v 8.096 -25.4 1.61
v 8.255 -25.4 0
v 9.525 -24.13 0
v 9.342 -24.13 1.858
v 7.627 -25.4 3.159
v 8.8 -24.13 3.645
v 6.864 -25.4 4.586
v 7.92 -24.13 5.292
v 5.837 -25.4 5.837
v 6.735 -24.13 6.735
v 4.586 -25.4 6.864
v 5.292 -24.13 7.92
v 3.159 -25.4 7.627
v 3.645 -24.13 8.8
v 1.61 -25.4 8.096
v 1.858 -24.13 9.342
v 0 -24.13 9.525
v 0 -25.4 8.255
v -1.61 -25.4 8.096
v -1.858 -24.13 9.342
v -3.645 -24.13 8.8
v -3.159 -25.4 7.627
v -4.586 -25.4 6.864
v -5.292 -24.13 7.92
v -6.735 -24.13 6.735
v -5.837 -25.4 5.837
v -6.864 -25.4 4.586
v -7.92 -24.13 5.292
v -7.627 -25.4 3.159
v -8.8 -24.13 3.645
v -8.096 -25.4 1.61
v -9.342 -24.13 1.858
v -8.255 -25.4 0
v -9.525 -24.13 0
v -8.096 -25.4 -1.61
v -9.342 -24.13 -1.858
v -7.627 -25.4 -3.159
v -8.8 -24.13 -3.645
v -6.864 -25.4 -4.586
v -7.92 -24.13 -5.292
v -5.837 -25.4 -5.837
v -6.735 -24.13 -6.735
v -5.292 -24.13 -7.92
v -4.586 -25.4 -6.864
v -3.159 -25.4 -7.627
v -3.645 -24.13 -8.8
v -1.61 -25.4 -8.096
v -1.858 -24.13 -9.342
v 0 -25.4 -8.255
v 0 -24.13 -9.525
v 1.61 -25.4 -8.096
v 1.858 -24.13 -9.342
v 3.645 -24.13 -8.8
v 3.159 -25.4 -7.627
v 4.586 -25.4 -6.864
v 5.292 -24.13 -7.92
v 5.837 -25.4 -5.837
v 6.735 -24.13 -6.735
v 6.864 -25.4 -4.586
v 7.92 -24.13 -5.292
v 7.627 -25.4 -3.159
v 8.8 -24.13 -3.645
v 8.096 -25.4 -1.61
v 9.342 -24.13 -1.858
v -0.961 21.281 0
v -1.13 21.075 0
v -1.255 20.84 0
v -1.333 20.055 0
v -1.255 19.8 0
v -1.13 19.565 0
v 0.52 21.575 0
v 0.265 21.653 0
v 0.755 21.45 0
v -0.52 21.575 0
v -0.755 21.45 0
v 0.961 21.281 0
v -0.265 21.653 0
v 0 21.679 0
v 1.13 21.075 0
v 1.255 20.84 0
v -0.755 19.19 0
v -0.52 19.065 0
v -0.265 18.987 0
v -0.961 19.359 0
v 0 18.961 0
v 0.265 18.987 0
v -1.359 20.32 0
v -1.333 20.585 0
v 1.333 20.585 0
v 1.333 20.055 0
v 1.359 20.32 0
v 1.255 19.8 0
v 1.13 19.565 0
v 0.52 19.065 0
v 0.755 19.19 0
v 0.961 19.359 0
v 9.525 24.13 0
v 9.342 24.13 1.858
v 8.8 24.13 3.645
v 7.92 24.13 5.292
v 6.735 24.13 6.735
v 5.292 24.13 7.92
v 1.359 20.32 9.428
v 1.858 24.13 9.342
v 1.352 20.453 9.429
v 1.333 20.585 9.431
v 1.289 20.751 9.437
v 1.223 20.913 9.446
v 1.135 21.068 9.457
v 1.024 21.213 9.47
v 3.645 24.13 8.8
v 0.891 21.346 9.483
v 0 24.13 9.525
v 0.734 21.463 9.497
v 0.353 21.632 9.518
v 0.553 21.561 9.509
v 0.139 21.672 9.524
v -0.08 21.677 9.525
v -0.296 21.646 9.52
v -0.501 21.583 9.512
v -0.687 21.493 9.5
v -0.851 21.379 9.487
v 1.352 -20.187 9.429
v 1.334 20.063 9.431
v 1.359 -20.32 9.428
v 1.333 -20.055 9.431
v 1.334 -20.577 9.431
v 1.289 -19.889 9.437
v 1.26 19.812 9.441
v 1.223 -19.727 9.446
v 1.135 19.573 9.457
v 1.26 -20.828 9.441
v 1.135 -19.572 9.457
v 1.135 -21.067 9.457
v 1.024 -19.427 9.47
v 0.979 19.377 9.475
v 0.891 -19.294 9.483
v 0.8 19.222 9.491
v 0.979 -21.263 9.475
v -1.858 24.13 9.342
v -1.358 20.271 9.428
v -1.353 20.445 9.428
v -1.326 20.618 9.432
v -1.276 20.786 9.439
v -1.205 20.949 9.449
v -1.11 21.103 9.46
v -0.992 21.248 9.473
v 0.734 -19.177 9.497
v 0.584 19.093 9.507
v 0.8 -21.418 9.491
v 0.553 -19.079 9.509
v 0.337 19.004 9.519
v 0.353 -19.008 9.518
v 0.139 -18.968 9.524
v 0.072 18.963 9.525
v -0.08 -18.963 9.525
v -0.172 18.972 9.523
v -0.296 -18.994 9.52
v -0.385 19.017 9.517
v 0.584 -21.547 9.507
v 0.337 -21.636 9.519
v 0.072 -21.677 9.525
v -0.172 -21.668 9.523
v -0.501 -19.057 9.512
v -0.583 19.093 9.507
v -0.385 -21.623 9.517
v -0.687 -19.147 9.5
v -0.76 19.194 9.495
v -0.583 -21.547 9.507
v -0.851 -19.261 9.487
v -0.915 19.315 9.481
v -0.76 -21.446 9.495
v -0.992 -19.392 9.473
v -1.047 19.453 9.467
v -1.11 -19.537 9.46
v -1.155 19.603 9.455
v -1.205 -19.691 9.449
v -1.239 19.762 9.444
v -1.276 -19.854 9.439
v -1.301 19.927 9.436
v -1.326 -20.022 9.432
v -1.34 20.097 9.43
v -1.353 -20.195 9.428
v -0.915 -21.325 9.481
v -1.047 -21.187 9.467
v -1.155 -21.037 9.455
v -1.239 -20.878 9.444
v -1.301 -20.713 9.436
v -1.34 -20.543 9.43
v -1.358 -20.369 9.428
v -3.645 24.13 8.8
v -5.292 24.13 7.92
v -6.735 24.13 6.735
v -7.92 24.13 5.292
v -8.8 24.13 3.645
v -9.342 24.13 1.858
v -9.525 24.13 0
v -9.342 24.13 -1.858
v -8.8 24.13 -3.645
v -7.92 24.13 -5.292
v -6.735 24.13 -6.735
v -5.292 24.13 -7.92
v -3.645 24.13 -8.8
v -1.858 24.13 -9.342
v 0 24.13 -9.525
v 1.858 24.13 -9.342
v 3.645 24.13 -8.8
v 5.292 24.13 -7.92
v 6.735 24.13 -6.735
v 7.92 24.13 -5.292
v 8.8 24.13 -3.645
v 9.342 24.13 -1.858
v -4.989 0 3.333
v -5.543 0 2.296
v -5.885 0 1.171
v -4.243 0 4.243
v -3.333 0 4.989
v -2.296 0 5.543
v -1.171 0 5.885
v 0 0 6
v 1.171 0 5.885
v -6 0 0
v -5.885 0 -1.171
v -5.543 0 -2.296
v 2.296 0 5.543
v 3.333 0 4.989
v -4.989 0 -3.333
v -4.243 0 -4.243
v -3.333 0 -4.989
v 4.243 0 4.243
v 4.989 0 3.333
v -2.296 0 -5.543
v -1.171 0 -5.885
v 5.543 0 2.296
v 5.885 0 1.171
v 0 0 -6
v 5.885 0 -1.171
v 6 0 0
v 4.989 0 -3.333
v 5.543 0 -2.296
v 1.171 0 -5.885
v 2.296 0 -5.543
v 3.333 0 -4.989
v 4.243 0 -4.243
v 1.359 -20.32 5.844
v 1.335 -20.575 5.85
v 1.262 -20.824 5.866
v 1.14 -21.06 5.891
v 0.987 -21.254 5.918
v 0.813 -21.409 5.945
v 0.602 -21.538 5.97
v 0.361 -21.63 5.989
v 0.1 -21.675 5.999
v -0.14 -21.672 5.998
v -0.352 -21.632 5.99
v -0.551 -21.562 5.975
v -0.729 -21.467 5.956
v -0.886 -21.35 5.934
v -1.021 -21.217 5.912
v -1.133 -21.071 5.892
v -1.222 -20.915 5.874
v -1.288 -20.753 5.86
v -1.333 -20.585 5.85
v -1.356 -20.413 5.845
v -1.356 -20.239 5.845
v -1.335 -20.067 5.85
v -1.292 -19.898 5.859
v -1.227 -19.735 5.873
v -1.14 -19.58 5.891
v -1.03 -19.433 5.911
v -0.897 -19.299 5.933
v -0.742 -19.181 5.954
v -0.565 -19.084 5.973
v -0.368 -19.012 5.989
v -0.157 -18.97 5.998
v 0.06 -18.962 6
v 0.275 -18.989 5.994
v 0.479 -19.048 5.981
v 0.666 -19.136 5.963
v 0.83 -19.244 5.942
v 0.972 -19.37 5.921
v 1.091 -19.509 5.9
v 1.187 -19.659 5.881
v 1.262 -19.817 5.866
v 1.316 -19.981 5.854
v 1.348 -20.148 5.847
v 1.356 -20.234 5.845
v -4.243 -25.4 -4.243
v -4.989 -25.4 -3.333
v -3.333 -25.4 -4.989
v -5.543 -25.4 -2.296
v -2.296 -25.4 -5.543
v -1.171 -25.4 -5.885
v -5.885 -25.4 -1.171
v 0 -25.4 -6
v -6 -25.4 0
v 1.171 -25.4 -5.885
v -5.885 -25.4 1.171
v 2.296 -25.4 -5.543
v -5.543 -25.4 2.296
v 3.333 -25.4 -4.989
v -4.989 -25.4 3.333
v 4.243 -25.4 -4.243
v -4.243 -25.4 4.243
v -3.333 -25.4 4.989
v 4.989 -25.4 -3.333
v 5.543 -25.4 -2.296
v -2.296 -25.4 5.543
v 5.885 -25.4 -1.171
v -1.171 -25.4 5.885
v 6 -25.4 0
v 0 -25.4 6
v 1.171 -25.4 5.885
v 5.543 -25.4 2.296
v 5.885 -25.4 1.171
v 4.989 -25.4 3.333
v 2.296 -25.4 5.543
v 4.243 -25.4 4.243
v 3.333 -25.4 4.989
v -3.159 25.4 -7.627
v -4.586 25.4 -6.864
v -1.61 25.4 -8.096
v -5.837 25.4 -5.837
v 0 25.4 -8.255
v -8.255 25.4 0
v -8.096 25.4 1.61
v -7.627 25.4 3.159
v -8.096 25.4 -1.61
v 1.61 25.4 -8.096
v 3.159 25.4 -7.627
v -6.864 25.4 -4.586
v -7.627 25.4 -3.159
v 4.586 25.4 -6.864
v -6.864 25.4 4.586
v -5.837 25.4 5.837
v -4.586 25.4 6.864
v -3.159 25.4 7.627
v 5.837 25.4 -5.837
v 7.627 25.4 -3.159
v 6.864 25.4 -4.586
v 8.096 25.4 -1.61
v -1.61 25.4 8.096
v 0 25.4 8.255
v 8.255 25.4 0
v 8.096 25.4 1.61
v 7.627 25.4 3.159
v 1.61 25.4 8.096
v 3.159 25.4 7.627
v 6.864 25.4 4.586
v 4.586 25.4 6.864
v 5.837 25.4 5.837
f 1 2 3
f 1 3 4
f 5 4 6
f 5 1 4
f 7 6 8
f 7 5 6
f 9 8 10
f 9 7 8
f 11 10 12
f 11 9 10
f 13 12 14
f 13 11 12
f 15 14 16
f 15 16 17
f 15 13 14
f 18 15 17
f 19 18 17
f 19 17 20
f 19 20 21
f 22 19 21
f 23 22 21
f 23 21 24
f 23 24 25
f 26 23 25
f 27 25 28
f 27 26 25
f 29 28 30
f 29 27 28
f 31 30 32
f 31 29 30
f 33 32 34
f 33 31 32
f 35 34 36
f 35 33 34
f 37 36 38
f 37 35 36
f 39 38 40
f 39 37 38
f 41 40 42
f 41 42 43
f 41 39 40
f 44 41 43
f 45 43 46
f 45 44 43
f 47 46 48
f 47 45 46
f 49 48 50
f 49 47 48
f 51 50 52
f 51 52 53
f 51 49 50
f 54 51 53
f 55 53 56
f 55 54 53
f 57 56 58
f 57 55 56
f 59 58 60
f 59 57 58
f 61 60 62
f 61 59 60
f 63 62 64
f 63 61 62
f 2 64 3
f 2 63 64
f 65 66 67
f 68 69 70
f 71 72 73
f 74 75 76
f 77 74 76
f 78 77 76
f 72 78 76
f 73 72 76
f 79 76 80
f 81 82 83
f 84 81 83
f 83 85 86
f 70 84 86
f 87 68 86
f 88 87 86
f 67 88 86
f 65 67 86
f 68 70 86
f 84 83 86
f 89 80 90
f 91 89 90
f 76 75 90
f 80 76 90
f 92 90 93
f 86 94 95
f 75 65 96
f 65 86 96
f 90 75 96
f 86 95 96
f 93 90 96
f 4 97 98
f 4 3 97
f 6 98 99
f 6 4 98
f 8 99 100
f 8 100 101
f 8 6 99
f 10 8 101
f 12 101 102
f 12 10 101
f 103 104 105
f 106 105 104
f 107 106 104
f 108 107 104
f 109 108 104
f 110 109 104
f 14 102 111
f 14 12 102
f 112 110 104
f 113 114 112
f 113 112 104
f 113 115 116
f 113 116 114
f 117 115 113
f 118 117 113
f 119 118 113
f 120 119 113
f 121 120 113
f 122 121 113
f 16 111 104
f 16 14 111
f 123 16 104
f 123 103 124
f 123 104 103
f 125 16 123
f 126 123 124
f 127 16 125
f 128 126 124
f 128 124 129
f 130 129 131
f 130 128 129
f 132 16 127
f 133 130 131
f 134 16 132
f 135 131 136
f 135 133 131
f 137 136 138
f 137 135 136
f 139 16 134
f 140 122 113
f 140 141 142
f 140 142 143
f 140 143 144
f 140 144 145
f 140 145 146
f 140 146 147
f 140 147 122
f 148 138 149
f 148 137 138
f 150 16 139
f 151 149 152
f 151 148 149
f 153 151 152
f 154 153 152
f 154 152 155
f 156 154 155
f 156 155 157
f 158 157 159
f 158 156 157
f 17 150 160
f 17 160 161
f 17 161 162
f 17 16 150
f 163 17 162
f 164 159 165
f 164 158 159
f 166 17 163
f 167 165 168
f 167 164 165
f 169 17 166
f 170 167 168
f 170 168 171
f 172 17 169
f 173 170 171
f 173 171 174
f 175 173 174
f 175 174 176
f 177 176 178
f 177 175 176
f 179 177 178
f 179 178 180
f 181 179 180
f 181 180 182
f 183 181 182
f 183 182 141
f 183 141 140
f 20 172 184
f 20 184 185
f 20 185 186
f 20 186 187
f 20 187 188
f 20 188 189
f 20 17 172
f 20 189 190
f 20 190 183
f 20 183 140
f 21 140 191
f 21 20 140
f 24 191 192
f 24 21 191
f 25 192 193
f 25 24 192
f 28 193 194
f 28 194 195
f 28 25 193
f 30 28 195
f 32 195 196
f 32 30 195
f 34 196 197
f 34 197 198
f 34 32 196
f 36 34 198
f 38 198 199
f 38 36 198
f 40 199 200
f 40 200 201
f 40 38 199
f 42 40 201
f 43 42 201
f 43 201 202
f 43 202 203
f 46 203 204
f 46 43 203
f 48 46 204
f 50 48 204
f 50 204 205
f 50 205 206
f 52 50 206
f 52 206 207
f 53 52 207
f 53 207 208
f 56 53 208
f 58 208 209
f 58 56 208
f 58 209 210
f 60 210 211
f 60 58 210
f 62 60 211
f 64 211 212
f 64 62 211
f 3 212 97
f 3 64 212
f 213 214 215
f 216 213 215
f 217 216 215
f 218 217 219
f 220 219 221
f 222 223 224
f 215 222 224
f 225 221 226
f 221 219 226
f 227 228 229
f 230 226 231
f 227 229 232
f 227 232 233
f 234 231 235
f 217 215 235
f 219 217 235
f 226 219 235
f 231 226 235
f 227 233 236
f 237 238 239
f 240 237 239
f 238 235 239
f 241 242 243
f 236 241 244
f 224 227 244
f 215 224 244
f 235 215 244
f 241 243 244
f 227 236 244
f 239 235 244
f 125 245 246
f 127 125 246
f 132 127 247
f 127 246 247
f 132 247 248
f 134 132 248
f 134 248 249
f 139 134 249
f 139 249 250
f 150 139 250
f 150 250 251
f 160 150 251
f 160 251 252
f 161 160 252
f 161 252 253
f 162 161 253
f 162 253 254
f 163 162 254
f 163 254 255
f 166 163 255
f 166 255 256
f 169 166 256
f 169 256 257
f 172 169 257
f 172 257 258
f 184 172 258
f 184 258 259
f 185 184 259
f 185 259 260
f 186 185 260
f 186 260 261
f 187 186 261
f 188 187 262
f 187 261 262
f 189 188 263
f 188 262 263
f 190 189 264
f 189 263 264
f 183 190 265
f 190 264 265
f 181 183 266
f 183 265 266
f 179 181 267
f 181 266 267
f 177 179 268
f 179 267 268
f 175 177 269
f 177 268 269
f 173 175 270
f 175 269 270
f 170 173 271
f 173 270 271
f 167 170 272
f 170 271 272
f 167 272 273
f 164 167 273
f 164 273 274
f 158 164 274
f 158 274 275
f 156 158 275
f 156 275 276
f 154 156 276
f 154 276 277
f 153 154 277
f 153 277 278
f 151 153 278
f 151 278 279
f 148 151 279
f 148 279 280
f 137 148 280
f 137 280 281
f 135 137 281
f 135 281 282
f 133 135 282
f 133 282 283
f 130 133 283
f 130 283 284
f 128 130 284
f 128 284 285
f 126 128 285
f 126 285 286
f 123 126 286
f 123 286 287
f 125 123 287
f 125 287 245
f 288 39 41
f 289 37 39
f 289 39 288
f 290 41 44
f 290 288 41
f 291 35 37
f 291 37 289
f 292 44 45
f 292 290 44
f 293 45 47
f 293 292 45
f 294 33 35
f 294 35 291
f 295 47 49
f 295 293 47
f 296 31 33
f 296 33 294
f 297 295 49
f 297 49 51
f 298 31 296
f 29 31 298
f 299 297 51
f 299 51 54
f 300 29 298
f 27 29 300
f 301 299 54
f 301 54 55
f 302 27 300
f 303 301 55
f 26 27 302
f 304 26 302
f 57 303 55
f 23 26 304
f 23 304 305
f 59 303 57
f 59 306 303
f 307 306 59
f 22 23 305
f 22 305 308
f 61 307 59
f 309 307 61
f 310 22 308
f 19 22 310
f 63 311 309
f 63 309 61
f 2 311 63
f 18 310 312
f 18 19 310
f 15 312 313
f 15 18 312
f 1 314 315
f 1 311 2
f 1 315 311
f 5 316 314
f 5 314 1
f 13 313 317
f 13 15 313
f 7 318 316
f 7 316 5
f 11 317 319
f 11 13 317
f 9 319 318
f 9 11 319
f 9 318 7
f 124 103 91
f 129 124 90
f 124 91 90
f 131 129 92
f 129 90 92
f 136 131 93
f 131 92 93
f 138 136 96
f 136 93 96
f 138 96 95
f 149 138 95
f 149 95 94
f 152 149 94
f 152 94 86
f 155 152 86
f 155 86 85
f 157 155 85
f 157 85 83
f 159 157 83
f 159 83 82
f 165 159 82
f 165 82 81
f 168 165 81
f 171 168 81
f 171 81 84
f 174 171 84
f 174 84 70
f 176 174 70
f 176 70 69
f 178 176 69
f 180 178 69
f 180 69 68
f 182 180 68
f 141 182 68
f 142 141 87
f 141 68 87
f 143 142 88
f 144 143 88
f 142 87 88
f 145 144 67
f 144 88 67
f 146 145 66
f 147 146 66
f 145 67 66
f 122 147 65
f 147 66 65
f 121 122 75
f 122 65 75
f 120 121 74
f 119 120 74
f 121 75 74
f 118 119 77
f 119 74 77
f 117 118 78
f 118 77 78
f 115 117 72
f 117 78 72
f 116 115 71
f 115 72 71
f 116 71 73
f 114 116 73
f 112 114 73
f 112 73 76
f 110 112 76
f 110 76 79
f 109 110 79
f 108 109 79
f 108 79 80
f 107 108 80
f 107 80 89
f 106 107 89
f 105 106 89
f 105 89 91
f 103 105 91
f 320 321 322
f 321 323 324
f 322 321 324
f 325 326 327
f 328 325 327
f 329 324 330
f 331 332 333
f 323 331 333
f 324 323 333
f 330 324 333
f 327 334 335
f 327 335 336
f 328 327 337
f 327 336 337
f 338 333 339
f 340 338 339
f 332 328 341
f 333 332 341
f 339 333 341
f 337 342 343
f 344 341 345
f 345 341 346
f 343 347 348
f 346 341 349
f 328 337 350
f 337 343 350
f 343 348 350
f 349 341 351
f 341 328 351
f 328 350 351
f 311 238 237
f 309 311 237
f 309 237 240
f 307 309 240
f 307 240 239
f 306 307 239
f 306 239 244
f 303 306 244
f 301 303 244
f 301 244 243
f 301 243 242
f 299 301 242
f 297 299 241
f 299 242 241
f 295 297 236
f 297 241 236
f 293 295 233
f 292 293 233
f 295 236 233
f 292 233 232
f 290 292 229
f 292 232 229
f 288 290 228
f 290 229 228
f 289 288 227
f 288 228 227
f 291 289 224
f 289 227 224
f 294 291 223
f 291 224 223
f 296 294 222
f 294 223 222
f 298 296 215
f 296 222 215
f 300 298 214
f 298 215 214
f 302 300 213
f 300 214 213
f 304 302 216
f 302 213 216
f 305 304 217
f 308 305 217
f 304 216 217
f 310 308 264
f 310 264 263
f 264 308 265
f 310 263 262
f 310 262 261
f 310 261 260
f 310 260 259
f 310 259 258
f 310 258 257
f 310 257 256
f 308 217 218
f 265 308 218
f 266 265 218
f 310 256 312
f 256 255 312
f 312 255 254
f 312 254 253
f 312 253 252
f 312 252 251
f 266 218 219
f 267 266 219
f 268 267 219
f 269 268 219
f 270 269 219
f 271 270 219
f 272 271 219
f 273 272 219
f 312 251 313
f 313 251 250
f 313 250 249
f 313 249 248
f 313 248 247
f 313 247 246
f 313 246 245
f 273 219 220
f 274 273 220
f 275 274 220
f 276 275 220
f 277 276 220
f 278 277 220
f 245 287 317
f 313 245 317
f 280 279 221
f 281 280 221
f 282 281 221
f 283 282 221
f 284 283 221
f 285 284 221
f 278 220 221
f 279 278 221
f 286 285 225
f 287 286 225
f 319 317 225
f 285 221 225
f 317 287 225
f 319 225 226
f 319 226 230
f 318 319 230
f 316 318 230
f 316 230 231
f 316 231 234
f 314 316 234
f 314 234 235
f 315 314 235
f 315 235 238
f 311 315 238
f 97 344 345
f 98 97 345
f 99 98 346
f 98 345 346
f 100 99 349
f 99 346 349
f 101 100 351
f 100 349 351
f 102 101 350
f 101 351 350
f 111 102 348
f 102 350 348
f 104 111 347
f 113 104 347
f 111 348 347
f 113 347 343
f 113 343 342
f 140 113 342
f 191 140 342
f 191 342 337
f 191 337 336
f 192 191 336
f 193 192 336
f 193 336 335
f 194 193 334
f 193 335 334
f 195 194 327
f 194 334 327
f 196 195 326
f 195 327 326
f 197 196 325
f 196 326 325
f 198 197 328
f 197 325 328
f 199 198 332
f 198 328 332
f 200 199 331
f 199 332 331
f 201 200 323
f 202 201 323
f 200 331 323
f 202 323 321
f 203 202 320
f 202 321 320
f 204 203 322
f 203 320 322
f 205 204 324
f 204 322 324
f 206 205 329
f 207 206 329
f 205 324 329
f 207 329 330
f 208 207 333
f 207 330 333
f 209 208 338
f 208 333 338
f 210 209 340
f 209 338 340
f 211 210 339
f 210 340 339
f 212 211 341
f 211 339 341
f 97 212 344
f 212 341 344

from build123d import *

# Parameters (mm, degrees)
F0_R          = 9.525
F1_DEPTH      = 25.4
F1_DEPTH_BACK = 25.4
F3_D          = 12
F3_DEPTH      = 25.401
F4_SIZE       = 1.27
F6_D          = 2.7178
F6_DEPTH      = 9.526


with BuildPart() as f1:
    # F0 (on Front) → F1 (new body, two sides)
    with BuildSketch(Plane.XZ) as f1_sk:
        Circle(F0_R)
    extrude(amount=F1_DEPTH)
    extrude(f1_sk.sketch, amount=-F1_DEPTH_BACK)

    # F3 (through all, one way)
    with BuildSketch(Plane(origin=(0, 0, 0), x_dir=(1, 0, 0), z_dir=(0, 1, 0))):
        with Locations((0, 0)):
            Circle(F3_D / 2)
    extrude(amount=-F3_DEPTH, mode=Mode.SUBTRACT)

    # F4
    f4_edges = [f1.edges().sort_by_distance(p)[0] for p in [
        (-9.525, -25.4, 0),
        (-9.525, 25.4, 0),
    ]]
    chamfer(f4_edges, length=F4_SIZE)

    # F6 (through all, one way)
    with BuildSketch(Plane(origin=(0, 0, 0), x_dir=(1, 0, 0), z_dir=(0, 0, -1))):
        with Locations((0, -20.32), (0, 20.32)):
            Circle(F6_D / 2)
    extrude(amount=-F6_DEPTH, mode=Mode.SUBTRACT)


solid = f1.part
